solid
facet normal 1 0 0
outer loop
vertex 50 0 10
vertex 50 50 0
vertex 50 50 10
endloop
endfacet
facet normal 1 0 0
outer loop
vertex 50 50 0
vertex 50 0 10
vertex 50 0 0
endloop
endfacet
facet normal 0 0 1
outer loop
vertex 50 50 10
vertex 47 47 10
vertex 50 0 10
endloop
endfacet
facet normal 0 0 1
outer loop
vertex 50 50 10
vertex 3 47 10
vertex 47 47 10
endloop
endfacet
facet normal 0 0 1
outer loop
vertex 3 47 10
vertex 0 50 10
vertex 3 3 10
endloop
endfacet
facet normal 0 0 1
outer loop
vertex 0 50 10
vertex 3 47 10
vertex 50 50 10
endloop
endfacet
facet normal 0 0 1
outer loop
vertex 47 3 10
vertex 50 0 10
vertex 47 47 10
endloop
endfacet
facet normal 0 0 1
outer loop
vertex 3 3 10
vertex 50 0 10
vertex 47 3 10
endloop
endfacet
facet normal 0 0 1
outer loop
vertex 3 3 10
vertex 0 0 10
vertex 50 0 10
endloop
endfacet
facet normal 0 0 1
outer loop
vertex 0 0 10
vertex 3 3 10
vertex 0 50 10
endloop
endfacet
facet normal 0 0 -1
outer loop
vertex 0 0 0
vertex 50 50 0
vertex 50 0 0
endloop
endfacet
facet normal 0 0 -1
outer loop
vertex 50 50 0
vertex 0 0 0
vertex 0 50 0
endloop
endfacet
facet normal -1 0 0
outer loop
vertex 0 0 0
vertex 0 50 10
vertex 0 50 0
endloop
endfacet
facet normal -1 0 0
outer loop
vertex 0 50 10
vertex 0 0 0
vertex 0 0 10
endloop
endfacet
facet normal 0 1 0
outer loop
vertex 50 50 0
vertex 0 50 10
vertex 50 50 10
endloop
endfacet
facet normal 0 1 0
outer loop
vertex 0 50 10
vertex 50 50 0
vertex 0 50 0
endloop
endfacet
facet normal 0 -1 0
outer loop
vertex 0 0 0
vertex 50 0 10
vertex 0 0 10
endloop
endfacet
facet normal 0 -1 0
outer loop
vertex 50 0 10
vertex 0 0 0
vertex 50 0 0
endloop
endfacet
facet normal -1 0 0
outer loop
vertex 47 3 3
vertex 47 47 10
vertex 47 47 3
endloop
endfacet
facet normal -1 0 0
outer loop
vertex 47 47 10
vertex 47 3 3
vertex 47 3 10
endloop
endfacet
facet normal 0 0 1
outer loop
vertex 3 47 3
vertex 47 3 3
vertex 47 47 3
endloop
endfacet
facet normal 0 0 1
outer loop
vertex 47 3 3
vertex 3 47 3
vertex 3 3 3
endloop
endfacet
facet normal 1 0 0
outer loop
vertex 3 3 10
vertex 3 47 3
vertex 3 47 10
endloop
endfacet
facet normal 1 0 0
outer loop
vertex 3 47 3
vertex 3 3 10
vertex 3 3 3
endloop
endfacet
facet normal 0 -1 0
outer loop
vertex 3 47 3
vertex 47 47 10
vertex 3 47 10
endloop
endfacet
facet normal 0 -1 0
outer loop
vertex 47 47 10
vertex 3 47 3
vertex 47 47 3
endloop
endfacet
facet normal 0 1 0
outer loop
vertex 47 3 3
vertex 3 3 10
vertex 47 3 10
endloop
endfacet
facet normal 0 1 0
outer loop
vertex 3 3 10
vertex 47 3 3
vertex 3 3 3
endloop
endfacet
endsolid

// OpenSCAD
// Generated by HEIDI for job job_1787745720594_46953f2c
// Product: 3D-Printable Model Preparation Package
// Request: Test model for functional verification
// Model type: box
// Generated: 2026-09-07T04:35:15.040Z
//
// This is a parameterized OpenSCAD model. You can adjust the
// parameters below to customize the dimensions before rendering.

// ─── Parameters ───
width = 50;       // X dimension in mm
height = 50;     // Y dimension in mm
depth = 10;       // Z dimension in mm
wall = 3;    // wall thickness in mm
$fn = 60;               // facet resolution

// Parametric hollow box
module parametric_box() {
    difference() {
        // Outer shell
        cube([width, height, depth]);
        // Inner cavity
        translate([wall, wall, wall])
            cube([width - wall * 2, height - wall * 2, depth - wall + 1]);
    }
}
parametric_box();
